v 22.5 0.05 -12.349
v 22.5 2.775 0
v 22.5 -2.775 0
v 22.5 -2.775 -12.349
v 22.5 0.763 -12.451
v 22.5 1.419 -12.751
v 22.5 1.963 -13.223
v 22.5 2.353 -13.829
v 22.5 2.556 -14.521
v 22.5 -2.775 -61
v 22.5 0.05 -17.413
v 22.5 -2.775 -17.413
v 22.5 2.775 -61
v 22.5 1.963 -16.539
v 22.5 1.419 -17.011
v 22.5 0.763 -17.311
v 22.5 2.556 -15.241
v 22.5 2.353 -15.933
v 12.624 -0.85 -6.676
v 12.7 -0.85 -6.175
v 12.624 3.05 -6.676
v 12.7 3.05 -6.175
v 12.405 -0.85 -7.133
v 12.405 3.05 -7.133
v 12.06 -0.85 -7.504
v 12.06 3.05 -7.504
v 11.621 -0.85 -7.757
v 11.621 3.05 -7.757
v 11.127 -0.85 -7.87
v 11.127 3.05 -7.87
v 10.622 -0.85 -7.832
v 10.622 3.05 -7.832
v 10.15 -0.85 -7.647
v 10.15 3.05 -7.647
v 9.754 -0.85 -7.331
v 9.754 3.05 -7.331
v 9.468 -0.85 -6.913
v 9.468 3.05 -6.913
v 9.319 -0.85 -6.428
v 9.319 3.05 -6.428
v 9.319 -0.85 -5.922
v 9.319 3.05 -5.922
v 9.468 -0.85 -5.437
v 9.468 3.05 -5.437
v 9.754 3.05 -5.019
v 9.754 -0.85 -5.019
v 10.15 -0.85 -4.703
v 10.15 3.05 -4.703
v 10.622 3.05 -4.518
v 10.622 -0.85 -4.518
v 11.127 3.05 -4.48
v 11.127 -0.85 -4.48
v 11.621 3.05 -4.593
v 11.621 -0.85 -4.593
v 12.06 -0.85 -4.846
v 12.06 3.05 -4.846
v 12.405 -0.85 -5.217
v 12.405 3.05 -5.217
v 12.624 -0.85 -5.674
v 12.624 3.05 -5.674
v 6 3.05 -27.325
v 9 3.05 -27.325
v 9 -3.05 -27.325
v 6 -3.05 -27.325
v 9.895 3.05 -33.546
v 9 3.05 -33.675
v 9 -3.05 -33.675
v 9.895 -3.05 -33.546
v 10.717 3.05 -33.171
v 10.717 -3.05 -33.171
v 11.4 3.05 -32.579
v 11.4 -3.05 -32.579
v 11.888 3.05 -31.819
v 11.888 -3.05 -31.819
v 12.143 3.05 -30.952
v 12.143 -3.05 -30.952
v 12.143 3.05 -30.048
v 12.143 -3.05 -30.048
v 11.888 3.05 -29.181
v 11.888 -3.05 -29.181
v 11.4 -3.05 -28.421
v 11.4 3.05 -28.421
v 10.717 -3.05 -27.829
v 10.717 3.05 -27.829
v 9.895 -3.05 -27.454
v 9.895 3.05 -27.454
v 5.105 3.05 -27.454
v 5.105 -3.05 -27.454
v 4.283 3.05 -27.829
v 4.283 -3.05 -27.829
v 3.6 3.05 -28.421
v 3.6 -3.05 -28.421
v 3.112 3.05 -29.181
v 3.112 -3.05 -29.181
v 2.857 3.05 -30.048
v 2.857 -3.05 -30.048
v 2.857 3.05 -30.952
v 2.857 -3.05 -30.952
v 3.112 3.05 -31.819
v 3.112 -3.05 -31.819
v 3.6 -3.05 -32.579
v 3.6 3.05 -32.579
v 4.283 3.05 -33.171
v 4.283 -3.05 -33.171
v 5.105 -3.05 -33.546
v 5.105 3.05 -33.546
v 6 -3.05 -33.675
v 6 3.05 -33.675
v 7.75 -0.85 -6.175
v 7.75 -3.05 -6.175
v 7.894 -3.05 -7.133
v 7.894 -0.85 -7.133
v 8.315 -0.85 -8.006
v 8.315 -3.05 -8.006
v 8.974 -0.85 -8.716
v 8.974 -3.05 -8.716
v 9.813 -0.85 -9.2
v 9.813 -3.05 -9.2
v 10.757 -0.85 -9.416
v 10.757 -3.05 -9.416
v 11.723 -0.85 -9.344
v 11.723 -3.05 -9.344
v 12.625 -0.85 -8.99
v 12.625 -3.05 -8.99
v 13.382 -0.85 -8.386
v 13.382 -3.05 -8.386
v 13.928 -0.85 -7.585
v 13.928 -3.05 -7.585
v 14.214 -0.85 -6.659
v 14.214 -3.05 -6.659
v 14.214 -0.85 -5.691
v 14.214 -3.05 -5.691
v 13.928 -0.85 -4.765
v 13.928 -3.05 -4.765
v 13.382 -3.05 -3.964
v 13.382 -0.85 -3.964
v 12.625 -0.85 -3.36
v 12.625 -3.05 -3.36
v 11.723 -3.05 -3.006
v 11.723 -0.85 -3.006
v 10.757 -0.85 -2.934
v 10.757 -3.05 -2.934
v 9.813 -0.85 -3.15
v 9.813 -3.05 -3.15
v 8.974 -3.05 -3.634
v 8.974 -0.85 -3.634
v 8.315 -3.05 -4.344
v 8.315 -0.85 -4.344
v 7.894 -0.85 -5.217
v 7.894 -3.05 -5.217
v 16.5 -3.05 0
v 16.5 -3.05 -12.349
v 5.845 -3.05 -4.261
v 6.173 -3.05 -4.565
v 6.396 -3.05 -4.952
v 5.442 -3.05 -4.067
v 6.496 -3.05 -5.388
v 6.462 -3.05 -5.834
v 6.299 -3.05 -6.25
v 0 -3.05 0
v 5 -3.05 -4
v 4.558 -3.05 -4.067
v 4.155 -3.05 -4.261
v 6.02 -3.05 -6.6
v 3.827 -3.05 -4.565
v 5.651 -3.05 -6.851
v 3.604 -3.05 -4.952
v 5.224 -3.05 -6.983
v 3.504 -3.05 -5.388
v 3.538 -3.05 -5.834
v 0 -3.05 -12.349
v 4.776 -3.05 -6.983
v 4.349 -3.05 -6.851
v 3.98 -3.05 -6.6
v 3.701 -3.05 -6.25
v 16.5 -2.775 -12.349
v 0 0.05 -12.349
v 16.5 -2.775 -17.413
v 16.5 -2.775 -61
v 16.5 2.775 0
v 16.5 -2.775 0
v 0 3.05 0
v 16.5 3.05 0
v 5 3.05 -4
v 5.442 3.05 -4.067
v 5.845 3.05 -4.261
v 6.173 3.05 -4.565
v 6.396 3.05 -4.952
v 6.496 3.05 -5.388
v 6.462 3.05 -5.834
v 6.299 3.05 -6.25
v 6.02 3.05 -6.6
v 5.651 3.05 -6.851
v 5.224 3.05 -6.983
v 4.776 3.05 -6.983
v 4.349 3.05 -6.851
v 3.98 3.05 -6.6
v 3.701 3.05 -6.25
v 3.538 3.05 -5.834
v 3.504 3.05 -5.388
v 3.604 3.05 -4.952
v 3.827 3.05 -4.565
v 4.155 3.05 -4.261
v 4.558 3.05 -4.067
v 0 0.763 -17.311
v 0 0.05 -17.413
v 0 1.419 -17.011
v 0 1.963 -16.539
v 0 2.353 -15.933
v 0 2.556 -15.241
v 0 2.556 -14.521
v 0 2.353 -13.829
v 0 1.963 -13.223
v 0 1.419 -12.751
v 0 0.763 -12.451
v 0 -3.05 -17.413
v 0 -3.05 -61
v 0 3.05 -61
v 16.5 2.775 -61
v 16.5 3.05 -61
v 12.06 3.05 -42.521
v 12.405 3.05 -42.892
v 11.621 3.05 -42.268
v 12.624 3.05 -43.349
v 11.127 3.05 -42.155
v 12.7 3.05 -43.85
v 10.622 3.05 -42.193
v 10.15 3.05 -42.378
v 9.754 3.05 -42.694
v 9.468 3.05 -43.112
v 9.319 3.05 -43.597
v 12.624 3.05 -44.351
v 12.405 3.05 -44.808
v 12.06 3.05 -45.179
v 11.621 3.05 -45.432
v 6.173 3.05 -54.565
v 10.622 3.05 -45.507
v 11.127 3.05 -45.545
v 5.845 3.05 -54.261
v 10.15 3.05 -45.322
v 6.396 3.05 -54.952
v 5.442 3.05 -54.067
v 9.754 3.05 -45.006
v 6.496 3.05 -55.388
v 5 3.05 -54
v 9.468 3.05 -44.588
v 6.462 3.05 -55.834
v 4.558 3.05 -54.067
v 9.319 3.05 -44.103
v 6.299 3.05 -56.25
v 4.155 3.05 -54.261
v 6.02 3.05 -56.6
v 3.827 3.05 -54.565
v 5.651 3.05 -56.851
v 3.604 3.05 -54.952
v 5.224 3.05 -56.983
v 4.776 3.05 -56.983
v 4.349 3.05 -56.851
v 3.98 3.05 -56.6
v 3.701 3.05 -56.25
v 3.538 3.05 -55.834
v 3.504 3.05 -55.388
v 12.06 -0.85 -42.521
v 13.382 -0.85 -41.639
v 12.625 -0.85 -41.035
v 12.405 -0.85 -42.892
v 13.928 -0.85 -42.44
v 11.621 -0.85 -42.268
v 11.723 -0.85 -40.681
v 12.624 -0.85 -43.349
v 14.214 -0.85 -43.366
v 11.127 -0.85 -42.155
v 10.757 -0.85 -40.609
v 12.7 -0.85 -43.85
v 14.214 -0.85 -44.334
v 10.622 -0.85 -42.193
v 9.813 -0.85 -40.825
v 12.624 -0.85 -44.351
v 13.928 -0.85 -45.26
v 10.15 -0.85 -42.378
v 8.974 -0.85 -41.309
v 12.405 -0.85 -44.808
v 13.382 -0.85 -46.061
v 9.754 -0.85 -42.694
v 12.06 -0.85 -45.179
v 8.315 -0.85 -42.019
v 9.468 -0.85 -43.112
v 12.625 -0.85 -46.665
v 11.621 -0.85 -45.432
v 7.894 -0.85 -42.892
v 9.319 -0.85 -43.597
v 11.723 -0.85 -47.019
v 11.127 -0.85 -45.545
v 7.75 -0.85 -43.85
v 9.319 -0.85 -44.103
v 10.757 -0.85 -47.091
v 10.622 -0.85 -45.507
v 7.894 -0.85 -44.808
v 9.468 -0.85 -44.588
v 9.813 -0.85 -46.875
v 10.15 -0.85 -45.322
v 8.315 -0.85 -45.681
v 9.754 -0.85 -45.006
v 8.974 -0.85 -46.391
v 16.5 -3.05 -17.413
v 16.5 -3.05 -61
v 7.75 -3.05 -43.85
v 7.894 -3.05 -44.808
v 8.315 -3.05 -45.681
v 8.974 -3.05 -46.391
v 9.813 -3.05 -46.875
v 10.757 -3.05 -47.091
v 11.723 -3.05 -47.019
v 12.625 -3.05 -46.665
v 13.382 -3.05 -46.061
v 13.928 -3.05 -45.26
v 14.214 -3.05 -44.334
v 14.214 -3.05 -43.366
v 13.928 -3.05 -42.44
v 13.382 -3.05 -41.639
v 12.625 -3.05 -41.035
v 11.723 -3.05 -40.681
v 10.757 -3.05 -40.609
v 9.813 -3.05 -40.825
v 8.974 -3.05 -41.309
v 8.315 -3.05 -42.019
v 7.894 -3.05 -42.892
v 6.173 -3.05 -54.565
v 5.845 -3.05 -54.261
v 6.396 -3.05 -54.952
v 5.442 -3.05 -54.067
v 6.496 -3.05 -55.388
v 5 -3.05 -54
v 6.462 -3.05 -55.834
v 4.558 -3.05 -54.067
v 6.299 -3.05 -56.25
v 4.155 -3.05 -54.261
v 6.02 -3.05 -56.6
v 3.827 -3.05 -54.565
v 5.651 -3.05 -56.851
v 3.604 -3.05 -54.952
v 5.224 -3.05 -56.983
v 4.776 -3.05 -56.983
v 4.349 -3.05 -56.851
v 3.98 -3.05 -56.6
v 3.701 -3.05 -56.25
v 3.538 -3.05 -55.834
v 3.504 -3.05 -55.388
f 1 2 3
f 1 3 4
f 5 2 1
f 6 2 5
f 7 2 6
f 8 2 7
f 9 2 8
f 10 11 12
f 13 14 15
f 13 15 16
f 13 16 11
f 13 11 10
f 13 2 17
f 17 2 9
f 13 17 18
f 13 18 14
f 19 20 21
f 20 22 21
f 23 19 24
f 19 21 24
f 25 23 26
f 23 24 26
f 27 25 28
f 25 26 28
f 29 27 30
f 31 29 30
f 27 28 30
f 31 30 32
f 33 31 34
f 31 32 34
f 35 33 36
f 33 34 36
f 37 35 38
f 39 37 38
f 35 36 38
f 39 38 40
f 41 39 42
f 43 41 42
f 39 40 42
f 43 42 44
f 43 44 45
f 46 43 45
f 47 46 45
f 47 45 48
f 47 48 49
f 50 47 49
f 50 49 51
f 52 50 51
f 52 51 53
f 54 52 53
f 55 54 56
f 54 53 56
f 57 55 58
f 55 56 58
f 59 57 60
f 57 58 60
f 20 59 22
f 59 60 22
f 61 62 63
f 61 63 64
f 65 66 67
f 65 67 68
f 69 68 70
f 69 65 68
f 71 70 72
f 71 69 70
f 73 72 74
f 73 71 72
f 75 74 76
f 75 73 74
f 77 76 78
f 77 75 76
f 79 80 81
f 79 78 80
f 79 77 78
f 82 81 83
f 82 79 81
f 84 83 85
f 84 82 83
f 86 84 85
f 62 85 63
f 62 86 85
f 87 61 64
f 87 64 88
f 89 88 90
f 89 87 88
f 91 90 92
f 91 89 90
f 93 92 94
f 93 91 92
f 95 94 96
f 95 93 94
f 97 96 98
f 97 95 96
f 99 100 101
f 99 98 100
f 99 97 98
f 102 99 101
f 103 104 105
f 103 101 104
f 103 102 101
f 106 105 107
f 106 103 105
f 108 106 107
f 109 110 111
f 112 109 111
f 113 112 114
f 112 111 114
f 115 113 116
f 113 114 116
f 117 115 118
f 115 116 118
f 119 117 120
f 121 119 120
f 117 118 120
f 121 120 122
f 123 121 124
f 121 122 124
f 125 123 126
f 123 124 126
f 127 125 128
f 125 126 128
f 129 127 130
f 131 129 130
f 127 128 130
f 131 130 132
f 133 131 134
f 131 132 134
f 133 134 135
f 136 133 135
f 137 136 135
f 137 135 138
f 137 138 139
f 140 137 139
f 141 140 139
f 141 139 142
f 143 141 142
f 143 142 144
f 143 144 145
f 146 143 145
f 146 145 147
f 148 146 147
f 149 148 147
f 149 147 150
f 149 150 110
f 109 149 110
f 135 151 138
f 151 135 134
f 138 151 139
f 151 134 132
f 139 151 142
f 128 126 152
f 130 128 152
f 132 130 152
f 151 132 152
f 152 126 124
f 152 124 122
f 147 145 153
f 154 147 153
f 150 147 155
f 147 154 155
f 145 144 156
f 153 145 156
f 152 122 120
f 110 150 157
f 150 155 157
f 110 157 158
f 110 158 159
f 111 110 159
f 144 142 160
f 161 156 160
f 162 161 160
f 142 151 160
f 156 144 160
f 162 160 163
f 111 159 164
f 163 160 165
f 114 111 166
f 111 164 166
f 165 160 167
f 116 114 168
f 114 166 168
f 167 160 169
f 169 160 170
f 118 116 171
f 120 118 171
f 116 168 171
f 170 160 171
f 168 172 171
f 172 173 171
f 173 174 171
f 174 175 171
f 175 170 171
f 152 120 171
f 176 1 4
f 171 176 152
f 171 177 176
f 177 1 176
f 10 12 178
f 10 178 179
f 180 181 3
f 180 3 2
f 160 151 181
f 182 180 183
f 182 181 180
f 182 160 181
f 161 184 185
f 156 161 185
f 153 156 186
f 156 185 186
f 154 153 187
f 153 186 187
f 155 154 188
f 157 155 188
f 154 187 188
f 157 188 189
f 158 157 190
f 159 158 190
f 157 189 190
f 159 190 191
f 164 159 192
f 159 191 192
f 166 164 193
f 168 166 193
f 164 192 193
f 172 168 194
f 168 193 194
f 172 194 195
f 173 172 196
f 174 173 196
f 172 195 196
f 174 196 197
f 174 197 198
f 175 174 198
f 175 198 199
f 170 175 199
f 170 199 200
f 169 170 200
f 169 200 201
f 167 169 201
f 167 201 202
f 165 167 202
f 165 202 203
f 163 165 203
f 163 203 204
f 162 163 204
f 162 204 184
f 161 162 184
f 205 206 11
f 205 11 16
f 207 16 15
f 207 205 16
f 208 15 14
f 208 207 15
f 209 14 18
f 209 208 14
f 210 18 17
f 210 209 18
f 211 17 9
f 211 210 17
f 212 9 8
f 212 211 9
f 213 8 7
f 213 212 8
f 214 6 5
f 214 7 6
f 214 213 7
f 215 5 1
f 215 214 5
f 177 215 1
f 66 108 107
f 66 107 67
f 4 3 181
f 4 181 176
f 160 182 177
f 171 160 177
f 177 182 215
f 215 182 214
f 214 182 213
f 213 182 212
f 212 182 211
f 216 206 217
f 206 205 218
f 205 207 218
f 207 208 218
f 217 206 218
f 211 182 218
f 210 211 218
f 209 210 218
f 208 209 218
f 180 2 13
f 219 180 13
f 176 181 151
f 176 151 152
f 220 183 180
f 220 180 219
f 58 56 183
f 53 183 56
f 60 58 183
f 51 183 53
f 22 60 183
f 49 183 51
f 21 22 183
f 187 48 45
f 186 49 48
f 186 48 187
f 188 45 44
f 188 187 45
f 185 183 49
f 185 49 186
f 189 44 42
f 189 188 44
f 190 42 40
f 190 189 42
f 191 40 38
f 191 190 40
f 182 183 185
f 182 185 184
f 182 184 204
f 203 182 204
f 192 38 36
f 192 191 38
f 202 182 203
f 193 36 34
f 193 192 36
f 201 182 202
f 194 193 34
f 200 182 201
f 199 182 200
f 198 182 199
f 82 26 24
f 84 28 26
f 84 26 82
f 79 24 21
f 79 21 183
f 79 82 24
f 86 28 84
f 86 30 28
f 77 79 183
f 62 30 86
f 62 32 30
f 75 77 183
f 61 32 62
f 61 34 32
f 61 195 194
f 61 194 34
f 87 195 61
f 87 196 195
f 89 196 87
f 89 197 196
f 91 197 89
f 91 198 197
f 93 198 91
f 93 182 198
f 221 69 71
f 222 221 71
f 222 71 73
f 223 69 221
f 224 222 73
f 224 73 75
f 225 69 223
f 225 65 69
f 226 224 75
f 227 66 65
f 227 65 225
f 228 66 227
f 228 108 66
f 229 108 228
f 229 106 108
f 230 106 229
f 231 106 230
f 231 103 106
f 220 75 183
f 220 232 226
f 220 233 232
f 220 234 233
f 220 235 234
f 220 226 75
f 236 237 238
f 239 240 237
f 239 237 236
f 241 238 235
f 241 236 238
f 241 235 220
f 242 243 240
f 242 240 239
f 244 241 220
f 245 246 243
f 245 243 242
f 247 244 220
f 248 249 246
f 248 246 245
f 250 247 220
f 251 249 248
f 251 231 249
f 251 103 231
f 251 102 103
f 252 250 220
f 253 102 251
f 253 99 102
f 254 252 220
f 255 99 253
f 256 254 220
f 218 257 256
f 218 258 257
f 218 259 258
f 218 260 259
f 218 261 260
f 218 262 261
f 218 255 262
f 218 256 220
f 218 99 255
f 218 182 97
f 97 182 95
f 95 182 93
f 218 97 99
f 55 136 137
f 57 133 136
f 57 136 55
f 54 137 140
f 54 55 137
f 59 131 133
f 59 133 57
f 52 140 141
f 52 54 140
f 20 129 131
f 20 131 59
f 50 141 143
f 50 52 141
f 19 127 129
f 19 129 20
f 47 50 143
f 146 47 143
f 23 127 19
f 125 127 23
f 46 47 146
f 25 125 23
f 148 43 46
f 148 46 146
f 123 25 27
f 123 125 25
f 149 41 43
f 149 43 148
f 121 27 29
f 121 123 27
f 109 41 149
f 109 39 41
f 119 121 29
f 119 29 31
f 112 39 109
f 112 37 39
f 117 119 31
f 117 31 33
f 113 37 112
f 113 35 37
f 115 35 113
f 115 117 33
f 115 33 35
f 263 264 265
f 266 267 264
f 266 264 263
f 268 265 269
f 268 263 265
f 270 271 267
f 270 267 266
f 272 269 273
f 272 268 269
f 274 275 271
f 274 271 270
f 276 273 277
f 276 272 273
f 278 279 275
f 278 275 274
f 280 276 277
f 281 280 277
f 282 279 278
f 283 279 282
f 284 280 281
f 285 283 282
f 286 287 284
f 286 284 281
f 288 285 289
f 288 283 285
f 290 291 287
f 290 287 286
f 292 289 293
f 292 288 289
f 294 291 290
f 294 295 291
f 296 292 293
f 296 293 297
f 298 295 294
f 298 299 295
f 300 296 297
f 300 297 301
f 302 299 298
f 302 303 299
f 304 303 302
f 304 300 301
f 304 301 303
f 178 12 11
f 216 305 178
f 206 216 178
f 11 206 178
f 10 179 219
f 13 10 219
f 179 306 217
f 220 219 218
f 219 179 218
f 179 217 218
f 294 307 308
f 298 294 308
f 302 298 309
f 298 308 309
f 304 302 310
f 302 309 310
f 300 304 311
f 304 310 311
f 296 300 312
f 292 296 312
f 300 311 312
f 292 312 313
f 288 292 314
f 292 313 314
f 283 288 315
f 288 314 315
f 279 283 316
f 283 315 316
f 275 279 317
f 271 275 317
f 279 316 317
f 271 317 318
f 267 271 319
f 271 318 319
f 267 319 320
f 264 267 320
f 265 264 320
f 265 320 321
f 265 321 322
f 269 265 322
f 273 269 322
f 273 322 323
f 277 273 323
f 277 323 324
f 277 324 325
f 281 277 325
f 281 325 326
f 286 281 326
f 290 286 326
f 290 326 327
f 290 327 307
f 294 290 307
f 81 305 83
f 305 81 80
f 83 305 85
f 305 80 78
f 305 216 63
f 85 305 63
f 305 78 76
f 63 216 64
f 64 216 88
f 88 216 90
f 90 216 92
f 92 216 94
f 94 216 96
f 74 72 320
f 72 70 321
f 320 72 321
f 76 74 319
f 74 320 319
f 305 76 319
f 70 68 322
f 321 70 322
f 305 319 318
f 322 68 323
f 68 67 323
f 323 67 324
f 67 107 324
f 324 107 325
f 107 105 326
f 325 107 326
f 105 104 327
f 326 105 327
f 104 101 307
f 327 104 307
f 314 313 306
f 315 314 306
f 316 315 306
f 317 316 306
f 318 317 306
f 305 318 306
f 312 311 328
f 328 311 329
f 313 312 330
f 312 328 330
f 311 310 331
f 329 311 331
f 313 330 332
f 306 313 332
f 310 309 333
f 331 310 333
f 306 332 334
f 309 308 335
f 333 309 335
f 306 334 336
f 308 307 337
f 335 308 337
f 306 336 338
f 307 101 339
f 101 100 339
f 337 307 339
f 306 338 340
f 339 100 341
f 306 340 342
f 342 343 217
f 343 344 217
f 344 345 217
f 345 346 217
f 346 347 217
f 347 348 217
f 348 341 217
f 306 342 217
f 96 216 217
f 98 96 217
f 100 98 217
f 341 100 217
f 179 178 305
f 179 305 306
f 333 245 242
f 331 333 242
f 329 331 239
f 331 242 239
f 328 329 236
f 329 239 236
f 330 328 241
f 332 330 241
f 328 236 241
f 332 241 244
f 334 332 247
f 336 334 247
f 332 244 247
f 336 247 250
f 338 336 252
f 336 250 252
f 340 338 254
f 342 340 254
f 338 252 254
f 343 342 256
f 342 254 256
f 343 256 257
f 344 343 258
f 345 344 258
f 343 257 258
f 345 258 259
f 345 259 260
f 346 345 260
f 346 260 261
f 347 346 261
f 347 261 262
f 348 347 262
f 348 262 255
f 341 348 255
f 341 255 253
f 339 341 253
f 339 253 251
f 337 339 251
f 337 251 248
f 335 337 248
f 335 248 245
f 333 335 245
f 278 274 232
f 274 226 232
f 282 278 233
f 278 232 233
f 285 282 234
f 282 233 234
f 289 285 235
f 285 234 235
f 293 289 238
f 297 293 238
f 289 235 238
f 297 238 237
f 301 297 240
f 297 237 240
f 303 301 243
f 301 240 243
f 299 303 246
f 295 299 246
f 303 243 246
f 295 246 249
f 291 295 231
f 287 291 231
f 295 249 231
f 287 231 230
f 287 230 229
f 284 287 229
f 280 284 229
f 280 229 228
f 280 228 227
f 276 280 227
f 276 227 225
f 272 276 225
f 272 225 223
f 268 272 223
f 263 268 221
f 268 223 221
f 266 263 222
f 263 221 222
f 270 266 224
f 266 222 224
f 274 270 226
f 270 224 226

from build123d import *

# Parameters (mm, degrees)
SKETCH1_W                                        = 61
SKETCH1_H                                        = 6.1
BOSS_EXTRUDE1_DEPTH                              = 22.5
SKETCH2_OUTSIDE_W                                = 76.06
SKETCH2_OUTSIDE_H                                = 21.16
SKETCH2_OUTSIDE_W_2                              = 61
SKETCH2_OUTSIDE_H_2                              = 5.55
CUT_EXTRUDE1_DEPTH                               = 6
CUT_EXTRUDE3_DEPTH                               = 23.5
CUT_EXTRUDE4_DEPTH                               = 7.1
SKETCH7_R                                        = 1.5
CUT_EXTRUDE5_DEPTH                               = 7.1
CBORE_FOR_M3_PAN_HEAD_MACHINE_SCREW2_D           = 3.4
CBORE_FOR_M3_PAN_HEAD_MACHINE_SCREW2_CBORE_D     = 6.5
CBORE_FOR_M3_PAN_HEAD_MACHINE_SCREW2_CBORE_DEPTH = 2.2


with BuildPart() as part:
    # Sketch1 → Boss-Extrude1 (new body)
    with BuildSketch(Plane(origin=(0, 0, 0), x_dir=(0, 0, -1), z_dir=(1, 0, 0))):
        with Locations((30.5, 0)):
            Rectangle(SKETCH1_W, SKETCH1_H)
    extrude(amount=BOSS_EXTRUDE1_DEPTH)

    # Sketch2 outside → Cut-Extrude1 (cut)
    with BuildSketch(Plane(origin=(22.5, 0, 0), x_dir=(0, 0, -1), z_dir=(1, 0, 0))):
        with Locations((30.5, 0)):
            Rectangle(SKETCH2_OUTSIDE_W, SKETCH2_OUTSIDE_H)
        with Locations((30.5, 0)):
            Rectangle(SKETCH2_OUTSIDE_W_2, SKETCH2_OUTSIDE_H_2, mode=Mode.SUBTRACT)
    extrude(amount=-CUT_EXTRUDE1_DEPTH, mode=Mode.SUBTRACT)

    # Sketch5 → Cut-Extrude3 (cut, through all)
    with BuildSketch(Plane.ZY):
        with BuildLine():
            Line((-12.3486, 0.0496), (-12.3486, -3.05))
            Line((-12.3486, -3.05), (-17.4134, -3.05))
            Line((-17.4134, -3.05), (-17.4134, 0.0496))
            ThreePointArc((-17.4134, 0.0496), (-14.881, 2.582), (-12.3486, 0.0496))
        make_face()
    extrude(amount=-CUT_EXTRUDE3_DEPTH, mode=Mode.SUBTRACT)

    # Sketch6 → Cut-Extrude4 (cut, through all)
    with BuildSketch(Plane(origin=(0, 3.05, 0), x_dir=(1, 0, 0), z_dir=(0, 1, 0))):
        with BuildLine():
            Line((9, 27.325), (6, 27.325))
            ThreePointArc((6, 27.325), (2.825, 30.5), (6, 33.675))
            Line((6, 33.675), (9, 33.675))
            ThreePointArc((9, 33.675), (12.175, 30.5), (9, 27.325))
        make_face()
    extrude(amount=-CUT_EXTRUDE4_DEPTH, mode=Mode.SUBTRACT)

    # Sketch7 → Cut-Extrude5 (cut, through all)
    with BuildSketch(Plane(origin=(0, 3.05, 0), x_dir=(1, 0, 0), z_dir=(0, 1, 0))):
        with Locations(Location((5, 55.5, 0), (0, 0, 270))):  # turned: the seam where the file's is
            Circle(SKETCH7_R)
        with Locations(Location((5, 5.5, 0), (0, 0, 270))):  # turned: the seam where the file's is
            Circle(SKETCH7_R)
    extrude(amount=-CUT_EXTRUDE5_DEPTH, mode=Mode.SUBTRACT)

    # CBORE for M3 Pan Head Machine Screw2 (through all)
    with Locations(Plane(origin=(0, -3.05, 0), x_dir=(-1, 0, 0), z_dir=(0, -1, 0))):
        with Locations((-11, 6.175), (-11, 43.85)):
            CounterBoreHole(CBORE_FOR_M3_PAN_HEAD_MACHINE_SCREW2_D / 2, CBORE_FOR_M3_PAN_HEAD_MACHINE_SCREW2_CBORE_D / 2, CBORE_FOR_M3_PAN_HEAD_MACHINE_SCREW2_CBORE_DEPTH)


solid = part.part
